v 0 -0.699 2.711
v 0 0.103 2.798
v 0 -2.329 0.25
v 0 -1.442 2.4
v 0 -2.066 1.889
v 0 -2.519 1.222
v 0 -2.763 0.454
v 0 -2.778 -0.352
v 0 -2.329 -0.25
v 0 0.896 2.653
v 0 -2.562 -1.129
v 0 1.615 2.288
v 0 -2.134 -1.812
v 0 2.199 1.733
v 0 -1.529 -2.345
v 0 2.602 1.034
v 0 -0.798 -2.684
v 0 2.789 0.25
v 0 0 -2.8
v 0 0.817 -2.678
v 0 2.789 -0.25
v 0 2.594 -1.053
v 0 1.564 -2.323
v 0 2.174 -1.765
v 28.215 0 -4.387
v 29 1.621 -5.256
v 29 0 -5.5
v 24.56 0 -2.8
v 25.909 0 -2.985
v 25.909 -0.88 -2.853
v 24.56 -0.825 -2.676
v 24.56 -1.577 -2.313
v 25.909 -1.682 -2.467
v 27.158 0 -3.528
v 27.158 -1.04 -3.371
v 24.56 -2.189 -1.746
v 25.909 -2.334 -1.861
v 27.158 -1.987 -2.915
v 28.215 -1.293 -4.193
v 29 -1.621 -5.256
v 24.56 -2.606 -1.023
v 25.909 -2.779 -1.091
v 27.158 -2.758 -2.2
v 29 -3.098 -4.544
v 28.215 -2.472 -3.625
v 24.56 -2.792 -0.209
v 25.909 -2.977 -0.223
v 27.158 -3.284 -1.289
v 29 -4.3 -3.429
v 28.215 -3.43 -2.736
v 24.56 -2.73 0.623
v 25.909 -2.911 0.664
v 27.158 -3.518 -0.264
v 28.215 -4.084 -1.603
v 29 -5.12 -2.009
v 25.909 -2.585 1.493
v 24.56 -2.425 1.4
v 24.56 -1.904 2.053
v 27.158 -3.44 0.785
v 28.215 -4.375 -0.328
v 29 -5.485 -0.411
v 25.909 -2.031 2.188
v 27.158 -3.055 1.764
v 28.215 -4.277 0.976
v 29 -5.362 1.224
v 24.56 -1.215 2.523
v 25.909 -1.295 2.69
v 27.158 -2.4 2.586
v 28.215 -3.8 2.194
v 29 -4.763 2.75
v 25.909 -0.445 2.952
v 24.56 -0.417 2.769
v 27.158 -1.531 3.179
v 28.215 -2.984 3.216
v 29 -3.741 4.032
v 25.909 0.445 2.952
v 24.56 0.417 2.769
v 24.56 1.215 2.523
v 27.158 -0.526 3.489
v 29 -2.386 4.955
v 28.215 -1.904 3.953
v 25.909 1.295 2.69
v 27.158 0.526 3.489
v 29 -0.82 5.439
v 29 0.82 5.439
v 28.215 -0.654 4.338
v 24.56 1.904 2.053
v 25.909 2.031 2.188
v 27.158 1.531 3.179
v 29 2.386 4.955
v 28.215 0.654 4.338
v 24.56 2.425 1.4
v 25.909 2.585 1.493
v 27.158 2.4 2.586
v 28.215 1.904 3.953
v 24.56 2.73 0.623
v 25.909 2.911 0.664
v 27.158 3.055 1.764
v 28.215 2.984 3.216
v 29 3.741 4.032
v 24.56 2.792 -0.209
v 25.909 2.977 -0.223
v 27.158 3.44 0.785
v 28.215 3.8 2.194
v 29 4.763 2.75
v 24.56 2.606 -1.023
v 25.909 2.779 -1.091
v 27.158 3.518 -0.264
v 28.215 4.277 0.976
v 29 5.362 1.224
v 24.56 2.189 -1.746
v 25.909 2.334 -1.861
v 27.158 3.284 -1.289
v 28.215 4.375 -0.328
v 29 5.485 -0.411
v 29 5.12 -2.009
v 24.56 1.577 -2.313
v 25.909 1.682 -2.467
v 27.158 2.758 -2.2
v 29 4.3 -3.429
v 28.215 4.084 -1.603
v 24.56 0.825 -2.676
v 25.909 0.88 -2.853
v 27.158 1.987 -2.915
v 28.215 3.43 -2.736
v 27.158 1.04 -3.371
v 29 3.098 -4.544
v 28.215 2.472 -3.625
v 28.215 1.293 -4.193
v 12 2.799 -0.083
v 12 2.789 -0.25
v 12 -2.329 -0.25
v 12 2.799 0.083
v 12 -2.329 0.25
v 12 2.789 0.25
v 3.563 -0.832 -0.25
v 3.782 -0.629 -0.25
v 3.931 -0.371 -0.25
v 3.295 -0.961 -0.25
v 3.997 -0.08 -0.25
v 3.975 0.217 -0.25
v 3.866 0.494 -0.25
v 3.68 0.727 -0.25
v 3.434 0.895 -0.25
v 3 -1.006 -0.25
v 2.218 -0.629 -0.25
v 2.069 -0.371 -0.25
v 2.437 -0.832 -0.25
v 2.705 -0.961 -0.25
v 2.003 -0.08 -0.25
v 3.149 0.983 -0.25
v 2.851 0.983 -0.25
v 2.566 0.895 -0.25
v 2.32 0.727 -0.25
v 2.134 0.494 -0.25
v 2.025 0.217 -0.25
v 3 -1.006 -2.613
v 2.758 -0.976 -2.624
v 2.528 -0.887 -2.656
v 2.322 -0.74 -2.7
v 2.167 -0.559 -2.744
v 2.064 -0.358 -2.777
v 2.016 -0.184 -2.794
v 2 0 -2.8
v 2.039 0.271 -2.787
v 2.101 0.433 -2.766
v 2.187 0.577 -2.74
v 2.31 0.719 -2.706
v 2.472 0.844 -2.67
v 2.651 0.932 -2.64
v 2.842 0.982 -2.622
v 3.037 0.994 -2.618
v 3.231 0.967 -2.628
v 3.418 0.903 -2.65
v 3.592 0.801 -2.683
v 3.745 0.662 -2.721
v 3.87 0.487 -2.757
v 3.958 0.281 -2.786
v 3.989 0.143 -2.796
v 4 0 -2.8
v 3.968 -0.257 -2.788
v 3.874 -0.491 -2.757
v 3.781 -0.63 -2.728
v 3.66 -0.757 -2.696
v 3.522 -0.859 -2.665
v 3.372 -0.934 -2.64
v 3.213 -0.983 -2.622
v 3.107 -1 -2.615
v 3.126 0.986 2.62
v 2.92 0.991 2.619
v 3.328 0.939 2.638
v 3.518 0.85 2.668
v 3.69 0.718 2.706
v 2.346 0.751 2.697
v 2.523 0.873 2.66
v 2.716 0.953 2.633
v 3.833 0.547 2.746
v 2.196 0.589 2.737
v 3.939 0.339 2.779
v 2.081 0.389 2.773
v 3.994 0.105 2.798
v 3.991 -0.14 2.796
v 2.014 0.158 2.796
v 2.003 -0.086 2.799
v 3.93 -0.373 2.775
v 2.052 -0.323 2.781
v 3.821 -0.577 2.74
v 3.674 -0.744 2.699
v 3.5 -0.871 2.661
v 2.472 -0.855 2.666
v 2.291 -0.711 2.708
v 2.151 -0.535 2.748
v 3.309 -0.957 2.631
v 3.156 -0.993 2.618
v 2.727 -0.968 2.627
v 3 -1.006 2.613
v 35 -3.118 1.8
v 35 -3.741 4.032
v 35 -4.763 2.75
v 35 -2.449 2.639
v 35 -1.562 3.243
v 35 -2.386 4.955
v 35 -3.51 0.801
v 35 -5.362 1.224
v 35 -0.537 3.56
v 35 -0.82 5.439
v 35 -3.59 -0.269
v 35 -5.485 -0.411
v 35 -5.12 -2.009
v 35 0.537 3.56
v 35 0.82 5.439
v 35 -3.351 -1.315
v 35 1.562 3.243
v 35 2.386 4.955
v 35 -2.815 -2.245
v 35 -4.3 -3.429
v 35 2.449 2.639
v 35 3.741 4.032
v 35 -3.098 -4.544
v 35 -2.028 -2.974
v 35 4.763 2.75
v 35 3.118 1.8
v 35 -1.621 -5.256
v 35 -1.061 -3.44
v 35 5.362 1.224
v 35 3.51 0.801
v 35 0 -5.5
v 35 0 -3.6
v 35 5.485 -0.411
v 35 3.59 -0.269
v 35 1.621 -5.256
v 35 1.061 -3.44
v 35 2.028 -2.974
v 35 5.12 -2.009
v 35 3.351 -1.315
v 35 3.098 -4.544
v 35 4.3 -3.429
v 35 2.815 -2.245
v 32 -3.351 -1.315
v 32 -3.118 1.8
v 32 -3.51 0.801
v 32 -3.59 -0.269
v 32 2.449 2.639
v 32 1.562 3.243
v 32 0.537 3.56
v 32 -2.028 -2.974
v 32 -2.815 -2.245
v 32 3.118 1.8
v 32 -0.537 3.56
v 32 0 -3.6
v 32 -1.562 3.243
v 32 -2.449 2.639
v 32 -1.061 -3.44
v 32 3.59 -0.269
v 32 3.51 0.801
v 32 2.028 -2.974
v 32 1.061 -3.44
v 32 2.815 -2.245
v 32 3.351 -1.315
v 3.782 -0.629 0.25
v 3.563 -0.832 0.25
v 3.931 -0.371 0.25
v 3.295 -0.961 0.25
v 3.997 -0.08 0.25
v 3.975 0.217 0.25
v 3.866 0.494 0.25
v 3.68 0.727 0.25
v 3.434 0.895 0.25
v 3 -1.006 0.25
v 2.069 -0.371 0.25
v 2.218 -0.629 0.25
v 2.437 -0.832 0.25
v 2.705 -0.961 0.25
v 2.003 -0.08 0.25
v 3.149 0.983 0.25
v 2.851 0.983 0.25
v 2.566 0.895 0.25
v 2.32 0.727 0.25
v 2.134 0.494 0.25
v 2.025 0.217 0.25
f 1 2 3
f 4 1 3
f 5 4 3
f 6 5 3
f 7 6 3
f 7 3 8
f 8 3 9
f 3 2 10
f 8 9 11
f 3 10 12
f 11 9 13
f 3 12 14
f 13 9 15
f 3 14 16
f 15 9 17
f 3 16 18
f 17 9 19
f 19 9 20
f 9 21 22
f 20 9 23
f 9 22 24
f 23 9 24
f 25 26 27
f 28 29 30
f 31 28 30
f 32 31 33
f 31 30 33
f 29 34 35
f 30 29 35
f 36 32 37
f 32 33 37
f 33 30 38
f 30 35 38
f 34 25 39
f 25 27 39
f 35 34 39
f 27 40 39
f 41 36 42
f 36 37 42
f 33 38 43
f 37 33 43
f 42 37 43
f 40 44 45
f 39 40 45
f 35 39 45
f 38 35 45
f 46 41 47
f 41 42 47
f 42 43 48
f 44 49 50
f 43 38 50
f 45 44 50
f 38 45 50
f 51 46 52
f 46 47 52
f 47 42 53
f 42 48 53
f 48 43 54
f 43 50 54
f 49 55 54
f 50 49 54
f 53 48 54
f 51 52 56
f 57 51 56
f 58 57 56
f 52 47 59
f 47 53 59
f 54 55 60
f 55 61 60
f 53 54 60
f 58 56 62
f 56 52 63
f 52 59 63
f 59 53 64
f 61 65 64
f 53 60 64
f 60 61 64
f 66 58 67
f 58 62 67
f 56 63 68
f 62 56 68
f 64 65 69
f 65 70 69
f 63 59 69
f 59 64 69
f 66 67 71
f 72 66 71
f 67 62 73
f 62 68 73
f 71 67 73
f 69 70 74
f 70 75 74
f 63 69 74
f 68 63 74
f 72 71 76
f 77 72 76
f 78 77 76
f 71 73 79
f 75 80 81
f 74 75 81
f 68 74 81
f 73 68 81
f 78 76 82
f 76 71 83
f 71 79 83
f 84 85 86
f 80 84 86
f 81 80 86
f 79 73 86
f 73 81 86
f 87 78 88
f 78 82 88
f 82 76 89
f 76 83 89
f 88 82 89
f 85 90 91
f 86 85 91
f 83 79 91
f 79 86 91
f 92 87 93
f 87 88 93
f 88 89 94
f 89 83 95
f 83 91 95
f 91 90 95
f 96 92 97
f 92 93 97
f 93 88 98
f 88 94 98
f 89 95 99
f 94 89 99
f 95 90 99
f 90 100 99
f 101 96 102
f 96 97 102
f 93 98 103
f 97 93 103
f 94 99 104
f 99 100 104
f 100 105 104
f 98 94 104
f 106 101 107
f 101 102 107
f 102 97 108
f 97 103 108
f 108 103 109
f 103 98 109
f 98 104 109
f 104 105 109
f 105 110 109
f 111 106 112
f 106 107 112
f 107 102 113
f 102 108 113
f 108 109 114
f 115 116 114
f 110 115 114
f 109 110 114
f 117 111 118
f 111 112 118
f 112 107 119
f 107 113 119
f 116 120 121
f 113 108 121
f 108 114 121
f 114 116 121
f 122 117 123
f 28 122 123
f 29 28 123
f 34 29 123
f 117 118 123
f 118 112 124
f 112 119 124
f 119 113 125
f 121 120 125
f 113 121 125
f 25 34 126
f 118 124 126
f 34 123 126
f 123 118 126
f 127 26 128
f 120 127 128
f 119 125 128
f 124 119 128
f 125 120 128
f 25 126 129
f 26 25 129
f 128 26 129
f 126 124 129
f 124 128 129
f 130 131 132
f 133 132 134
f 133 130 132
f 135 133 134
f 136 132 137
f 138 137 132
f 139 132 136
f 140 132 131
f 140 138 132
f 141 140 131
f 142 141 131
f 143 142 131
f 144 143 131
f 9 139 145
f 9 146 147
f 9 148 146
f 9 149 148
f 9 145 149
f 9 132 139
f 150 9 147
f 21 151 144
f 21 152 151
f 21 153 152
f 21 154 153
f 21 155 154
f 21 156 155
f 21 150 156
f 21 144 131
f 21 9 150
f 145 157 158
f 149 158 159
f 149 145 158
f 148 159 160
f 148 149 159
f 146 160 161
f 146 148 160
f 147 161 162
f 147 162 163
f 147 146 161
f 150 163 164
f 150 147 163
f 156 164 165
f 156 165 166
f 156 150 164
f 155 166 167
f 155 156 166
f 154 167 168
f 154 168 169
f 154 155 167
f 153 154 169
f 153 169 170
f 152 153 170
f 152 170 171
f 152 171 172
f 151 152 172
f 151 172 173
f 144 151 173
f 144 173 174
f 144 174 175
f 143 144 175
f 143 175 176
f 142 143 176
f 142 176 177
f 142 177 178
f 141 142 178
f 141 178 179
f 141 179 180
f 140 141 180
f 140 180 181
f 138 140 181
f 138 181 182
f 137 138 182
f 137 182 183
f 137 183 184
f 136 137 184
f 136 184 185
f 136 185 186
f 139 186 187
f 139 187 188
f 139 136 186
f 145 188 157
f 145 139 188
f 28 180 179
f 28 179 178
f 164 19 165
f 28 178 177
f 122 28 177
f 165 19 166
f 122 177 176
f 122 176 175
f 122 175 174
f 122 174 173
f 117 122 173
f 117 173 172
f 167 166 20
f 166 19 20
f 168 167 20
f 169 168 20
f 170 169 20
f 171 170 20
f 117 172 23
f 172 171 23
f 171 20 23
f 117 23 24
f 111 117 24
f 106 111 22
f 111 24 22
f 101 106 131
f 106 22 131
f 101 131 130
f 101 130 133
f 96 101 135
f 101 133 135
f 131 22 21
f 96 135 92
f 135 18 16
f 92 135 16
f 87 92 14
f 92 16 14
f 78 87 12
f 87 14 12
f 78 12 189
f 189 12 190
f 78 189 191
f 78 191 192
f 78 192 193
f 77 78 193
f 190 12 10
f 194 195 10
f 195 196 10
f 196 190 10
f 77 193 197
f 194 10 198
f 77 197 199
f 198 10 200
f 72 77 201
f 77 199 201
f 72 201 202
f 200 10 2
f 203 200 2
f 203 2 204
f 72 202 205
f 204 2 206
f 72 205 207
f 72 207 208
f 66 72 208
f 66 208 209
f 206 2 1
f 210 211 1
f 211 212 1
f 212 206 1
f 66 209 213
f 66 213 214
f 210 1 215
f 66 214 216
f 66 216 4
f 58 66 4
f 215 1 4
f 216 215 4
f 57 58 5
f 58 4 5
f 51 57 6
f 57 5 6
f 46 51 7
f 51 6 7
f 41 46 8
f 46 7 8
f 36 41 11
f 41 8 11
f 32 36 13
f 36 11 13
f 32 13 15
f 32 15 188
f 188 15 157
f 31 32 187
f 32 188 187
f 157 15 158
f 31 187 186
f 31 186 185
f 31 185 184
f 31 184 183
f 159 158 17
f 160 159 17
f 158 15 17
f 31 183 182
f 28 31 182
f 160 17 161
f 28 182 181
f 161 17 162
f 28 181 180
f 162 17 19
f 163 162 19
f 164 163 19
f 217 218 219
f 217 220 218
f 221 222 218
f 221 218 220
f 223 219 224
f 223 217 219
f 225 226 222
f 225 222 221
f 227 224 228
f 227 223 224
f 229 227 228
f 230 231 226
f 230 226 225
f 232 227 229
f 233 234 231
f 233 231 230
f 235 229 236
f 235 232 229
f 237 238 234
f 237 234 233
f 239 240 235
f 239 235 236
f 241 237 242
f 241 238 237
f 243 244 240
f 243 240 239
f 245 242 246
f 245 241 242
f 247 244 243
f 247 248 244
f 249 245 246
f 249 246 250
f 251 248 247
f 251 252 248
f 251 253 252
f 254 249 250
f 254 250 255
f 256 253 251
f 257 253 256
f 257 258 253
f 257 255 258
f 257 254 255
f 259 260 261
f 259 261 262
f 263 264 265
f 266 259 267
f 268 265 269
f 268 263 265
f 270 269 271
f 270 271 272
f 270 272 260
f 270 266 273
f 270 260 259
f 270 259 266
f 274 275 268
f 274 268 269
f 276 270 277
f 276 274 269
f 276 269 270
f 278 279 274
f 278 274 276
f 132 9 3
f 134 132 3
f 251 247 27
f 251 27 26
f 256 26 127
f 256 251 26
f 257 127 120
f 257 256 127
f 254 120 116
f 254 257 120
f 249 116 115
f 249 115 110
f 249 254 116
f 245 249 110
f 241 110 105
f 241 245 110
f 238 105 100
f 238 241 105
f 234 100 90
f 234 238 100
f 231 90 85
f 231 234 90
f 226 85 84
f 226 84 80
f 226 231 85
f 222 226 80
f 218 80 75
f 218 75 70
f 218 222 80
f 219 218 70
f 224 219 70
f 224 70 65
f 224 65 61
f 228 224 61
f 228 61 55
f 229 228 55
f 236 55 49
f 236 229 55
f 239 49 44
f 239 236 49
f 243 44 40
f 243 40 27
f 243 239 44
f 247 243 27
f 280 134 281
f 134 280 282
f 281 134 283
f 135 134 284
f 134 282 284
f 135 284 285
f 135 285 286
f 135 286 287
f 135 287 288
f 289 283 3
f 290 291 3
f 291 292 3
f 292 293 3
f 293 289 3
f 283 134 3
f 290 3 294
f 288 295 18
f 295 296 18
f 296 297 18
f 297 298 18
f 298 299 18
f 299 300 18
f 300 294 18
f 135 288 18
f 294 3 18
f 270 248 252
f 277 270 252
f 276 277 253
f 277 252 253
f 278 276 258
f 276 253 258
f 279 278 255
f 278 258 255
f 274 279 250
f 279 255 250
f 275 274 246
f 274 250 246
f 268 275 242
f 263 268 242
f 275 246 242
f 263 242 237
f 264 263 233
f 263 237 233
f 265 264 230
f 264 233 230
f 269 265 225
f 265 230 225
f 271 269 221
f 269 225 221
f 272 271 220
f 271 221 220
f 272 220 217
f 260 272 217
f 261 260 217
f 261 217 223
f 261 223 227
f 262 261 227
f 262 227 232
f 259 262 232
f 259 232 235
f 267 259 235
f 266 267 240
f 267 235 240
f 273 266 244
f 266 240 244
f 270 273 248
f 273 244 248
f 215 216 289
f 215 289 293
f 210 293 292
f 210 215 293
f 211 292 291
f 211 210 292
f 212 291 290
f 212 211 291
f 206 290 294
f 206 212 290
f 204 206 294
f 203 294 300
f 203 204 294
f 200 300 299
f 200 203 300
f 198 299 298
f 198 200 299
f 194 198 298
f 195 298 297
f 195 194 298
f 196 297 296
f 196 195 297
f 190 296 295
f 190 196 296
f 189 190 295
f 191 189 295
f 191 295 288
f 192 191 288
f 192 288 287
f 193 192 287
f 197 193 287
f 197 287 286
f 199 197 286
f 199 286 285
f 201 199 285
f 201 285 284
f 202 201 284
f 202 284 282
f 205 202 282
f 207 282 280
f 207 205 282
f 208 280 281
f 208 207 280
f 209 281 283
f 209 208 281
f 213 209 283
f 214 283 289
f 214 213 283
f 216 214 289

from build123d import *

# Parameters (mm, degrees)
SKETCH_1_R               = 2.8
EXTRUDE_1_DEPTH          = 35
SKETCH_2_W               = 0.5
SKETCH_2_H               = 5.450532248
CUT_EXTRUDE_1_DEPTH      = 12
CUT_EXTRUDE_2_DEPTH      = 10
CUT_EXTRUDE_2_DEPTH_BACK = 10
SKETCH_3_R               = 1
SKETCH_4_R               = 5.5
EXTRUDE_2_DEPTH          = 6
SKETCH_5_R               = 3.6
CUT_EXTRUDE_3_DEPTH      = 3
FILLET_1_R               = 5


with BuildPart() as part:
    # 草图1 → 凸台-拉伸1 (new body)
    with BuildSketch(Plane(origin=(0, 0, 0), x_dir=(0, 0, -1), z_dir=(1, 0, 0))):
        Circle(SKETCH_1_R)
    extrude(amount=EXTRUDE_1_DEPTH)

    # 草图2 → 切除-拉伸1 (cut)
    with BuildSketch(Plane.ZY):
        with Locations((0, 0.396255312)):
            Rectangle(SKETCH_2_W, SKETCH_2_H)
    extrude(amount=-CUT_EXTRUDE_1_DEPTH, mode=Mode.SUBTRACT)

    # 草图3 → 切除-拉伸2 (cut, two sides: drawn at the far end of the back side and taken through both)
    with BuildSketch(Plane(origin=(0, 0, 0.25), x_dir=(-1, 0, 0), z_dir=(0, 0, -1)).offset(-CUT_EXTRUDE_2_DEPTH_BACK)):
        with Locations(Location((-3, -0.005591523, 0), (0, 0, 270))):
            Circle(SKETCH_3_R)
    extrude(amount=CUT_EXTRUDE_2_DEPTH + CUT_EXTRUDE_2_DEPTH_BACK, mode=Mode.SUBTRACT)

    # 草图4 → 凸台-拉伸2 (add)
    with BuildSketch(Plane(origin=(35, 0, 0), x_dir=(0, 0, -1), z_dir=(1, 0, 0))):
        Circle(SKETCH_4_R)
    extrude(amount=-EXTRUDE_2_DEPTH)

    # 草图5 → 切除-拉伸3 (cut)
    with BuildSketch(Plane(origin=(35, 0, 0), x_dir=(0, 0, -1), z_dir=(1, 0, 0))):
        Circle(SKETCH_5_R)
    extrude(amount=-CUT_EXTRUDE_3_DEPTH, mode=Mode.SUBTRACT)

    # 圆角1
    # the kernel refuses this fillet: 5 mm, written as the material it adds along each edge
    with BuildSketch(Plane(origin=(29, 0, 0), x_dir=(0, 0, -1), z_dir=(0, 1, 0))) as fillet_1_piece_1:
        with BuildLine():
            CenterArc((7.8, 4.439594576), FILLET_1_R, 180, 62.612892497)
            Line((5.5, 0), (5.454, -0.088791892))
            ThreePointArc((5.454, -0.088791892), (4.15, -0.1), (2.8, -0.1))
            Line((2.8, -0.1), (2.7, 0))
            Line((2.7, 0), (2.7, 4.439594576))
            Line((2.7, 4.439594576), (2.8, 4.439594576))
        make_face()
    revolve(axis=Axis((29, 0, 0), (-1, 0, 0)))


solid = part.part
